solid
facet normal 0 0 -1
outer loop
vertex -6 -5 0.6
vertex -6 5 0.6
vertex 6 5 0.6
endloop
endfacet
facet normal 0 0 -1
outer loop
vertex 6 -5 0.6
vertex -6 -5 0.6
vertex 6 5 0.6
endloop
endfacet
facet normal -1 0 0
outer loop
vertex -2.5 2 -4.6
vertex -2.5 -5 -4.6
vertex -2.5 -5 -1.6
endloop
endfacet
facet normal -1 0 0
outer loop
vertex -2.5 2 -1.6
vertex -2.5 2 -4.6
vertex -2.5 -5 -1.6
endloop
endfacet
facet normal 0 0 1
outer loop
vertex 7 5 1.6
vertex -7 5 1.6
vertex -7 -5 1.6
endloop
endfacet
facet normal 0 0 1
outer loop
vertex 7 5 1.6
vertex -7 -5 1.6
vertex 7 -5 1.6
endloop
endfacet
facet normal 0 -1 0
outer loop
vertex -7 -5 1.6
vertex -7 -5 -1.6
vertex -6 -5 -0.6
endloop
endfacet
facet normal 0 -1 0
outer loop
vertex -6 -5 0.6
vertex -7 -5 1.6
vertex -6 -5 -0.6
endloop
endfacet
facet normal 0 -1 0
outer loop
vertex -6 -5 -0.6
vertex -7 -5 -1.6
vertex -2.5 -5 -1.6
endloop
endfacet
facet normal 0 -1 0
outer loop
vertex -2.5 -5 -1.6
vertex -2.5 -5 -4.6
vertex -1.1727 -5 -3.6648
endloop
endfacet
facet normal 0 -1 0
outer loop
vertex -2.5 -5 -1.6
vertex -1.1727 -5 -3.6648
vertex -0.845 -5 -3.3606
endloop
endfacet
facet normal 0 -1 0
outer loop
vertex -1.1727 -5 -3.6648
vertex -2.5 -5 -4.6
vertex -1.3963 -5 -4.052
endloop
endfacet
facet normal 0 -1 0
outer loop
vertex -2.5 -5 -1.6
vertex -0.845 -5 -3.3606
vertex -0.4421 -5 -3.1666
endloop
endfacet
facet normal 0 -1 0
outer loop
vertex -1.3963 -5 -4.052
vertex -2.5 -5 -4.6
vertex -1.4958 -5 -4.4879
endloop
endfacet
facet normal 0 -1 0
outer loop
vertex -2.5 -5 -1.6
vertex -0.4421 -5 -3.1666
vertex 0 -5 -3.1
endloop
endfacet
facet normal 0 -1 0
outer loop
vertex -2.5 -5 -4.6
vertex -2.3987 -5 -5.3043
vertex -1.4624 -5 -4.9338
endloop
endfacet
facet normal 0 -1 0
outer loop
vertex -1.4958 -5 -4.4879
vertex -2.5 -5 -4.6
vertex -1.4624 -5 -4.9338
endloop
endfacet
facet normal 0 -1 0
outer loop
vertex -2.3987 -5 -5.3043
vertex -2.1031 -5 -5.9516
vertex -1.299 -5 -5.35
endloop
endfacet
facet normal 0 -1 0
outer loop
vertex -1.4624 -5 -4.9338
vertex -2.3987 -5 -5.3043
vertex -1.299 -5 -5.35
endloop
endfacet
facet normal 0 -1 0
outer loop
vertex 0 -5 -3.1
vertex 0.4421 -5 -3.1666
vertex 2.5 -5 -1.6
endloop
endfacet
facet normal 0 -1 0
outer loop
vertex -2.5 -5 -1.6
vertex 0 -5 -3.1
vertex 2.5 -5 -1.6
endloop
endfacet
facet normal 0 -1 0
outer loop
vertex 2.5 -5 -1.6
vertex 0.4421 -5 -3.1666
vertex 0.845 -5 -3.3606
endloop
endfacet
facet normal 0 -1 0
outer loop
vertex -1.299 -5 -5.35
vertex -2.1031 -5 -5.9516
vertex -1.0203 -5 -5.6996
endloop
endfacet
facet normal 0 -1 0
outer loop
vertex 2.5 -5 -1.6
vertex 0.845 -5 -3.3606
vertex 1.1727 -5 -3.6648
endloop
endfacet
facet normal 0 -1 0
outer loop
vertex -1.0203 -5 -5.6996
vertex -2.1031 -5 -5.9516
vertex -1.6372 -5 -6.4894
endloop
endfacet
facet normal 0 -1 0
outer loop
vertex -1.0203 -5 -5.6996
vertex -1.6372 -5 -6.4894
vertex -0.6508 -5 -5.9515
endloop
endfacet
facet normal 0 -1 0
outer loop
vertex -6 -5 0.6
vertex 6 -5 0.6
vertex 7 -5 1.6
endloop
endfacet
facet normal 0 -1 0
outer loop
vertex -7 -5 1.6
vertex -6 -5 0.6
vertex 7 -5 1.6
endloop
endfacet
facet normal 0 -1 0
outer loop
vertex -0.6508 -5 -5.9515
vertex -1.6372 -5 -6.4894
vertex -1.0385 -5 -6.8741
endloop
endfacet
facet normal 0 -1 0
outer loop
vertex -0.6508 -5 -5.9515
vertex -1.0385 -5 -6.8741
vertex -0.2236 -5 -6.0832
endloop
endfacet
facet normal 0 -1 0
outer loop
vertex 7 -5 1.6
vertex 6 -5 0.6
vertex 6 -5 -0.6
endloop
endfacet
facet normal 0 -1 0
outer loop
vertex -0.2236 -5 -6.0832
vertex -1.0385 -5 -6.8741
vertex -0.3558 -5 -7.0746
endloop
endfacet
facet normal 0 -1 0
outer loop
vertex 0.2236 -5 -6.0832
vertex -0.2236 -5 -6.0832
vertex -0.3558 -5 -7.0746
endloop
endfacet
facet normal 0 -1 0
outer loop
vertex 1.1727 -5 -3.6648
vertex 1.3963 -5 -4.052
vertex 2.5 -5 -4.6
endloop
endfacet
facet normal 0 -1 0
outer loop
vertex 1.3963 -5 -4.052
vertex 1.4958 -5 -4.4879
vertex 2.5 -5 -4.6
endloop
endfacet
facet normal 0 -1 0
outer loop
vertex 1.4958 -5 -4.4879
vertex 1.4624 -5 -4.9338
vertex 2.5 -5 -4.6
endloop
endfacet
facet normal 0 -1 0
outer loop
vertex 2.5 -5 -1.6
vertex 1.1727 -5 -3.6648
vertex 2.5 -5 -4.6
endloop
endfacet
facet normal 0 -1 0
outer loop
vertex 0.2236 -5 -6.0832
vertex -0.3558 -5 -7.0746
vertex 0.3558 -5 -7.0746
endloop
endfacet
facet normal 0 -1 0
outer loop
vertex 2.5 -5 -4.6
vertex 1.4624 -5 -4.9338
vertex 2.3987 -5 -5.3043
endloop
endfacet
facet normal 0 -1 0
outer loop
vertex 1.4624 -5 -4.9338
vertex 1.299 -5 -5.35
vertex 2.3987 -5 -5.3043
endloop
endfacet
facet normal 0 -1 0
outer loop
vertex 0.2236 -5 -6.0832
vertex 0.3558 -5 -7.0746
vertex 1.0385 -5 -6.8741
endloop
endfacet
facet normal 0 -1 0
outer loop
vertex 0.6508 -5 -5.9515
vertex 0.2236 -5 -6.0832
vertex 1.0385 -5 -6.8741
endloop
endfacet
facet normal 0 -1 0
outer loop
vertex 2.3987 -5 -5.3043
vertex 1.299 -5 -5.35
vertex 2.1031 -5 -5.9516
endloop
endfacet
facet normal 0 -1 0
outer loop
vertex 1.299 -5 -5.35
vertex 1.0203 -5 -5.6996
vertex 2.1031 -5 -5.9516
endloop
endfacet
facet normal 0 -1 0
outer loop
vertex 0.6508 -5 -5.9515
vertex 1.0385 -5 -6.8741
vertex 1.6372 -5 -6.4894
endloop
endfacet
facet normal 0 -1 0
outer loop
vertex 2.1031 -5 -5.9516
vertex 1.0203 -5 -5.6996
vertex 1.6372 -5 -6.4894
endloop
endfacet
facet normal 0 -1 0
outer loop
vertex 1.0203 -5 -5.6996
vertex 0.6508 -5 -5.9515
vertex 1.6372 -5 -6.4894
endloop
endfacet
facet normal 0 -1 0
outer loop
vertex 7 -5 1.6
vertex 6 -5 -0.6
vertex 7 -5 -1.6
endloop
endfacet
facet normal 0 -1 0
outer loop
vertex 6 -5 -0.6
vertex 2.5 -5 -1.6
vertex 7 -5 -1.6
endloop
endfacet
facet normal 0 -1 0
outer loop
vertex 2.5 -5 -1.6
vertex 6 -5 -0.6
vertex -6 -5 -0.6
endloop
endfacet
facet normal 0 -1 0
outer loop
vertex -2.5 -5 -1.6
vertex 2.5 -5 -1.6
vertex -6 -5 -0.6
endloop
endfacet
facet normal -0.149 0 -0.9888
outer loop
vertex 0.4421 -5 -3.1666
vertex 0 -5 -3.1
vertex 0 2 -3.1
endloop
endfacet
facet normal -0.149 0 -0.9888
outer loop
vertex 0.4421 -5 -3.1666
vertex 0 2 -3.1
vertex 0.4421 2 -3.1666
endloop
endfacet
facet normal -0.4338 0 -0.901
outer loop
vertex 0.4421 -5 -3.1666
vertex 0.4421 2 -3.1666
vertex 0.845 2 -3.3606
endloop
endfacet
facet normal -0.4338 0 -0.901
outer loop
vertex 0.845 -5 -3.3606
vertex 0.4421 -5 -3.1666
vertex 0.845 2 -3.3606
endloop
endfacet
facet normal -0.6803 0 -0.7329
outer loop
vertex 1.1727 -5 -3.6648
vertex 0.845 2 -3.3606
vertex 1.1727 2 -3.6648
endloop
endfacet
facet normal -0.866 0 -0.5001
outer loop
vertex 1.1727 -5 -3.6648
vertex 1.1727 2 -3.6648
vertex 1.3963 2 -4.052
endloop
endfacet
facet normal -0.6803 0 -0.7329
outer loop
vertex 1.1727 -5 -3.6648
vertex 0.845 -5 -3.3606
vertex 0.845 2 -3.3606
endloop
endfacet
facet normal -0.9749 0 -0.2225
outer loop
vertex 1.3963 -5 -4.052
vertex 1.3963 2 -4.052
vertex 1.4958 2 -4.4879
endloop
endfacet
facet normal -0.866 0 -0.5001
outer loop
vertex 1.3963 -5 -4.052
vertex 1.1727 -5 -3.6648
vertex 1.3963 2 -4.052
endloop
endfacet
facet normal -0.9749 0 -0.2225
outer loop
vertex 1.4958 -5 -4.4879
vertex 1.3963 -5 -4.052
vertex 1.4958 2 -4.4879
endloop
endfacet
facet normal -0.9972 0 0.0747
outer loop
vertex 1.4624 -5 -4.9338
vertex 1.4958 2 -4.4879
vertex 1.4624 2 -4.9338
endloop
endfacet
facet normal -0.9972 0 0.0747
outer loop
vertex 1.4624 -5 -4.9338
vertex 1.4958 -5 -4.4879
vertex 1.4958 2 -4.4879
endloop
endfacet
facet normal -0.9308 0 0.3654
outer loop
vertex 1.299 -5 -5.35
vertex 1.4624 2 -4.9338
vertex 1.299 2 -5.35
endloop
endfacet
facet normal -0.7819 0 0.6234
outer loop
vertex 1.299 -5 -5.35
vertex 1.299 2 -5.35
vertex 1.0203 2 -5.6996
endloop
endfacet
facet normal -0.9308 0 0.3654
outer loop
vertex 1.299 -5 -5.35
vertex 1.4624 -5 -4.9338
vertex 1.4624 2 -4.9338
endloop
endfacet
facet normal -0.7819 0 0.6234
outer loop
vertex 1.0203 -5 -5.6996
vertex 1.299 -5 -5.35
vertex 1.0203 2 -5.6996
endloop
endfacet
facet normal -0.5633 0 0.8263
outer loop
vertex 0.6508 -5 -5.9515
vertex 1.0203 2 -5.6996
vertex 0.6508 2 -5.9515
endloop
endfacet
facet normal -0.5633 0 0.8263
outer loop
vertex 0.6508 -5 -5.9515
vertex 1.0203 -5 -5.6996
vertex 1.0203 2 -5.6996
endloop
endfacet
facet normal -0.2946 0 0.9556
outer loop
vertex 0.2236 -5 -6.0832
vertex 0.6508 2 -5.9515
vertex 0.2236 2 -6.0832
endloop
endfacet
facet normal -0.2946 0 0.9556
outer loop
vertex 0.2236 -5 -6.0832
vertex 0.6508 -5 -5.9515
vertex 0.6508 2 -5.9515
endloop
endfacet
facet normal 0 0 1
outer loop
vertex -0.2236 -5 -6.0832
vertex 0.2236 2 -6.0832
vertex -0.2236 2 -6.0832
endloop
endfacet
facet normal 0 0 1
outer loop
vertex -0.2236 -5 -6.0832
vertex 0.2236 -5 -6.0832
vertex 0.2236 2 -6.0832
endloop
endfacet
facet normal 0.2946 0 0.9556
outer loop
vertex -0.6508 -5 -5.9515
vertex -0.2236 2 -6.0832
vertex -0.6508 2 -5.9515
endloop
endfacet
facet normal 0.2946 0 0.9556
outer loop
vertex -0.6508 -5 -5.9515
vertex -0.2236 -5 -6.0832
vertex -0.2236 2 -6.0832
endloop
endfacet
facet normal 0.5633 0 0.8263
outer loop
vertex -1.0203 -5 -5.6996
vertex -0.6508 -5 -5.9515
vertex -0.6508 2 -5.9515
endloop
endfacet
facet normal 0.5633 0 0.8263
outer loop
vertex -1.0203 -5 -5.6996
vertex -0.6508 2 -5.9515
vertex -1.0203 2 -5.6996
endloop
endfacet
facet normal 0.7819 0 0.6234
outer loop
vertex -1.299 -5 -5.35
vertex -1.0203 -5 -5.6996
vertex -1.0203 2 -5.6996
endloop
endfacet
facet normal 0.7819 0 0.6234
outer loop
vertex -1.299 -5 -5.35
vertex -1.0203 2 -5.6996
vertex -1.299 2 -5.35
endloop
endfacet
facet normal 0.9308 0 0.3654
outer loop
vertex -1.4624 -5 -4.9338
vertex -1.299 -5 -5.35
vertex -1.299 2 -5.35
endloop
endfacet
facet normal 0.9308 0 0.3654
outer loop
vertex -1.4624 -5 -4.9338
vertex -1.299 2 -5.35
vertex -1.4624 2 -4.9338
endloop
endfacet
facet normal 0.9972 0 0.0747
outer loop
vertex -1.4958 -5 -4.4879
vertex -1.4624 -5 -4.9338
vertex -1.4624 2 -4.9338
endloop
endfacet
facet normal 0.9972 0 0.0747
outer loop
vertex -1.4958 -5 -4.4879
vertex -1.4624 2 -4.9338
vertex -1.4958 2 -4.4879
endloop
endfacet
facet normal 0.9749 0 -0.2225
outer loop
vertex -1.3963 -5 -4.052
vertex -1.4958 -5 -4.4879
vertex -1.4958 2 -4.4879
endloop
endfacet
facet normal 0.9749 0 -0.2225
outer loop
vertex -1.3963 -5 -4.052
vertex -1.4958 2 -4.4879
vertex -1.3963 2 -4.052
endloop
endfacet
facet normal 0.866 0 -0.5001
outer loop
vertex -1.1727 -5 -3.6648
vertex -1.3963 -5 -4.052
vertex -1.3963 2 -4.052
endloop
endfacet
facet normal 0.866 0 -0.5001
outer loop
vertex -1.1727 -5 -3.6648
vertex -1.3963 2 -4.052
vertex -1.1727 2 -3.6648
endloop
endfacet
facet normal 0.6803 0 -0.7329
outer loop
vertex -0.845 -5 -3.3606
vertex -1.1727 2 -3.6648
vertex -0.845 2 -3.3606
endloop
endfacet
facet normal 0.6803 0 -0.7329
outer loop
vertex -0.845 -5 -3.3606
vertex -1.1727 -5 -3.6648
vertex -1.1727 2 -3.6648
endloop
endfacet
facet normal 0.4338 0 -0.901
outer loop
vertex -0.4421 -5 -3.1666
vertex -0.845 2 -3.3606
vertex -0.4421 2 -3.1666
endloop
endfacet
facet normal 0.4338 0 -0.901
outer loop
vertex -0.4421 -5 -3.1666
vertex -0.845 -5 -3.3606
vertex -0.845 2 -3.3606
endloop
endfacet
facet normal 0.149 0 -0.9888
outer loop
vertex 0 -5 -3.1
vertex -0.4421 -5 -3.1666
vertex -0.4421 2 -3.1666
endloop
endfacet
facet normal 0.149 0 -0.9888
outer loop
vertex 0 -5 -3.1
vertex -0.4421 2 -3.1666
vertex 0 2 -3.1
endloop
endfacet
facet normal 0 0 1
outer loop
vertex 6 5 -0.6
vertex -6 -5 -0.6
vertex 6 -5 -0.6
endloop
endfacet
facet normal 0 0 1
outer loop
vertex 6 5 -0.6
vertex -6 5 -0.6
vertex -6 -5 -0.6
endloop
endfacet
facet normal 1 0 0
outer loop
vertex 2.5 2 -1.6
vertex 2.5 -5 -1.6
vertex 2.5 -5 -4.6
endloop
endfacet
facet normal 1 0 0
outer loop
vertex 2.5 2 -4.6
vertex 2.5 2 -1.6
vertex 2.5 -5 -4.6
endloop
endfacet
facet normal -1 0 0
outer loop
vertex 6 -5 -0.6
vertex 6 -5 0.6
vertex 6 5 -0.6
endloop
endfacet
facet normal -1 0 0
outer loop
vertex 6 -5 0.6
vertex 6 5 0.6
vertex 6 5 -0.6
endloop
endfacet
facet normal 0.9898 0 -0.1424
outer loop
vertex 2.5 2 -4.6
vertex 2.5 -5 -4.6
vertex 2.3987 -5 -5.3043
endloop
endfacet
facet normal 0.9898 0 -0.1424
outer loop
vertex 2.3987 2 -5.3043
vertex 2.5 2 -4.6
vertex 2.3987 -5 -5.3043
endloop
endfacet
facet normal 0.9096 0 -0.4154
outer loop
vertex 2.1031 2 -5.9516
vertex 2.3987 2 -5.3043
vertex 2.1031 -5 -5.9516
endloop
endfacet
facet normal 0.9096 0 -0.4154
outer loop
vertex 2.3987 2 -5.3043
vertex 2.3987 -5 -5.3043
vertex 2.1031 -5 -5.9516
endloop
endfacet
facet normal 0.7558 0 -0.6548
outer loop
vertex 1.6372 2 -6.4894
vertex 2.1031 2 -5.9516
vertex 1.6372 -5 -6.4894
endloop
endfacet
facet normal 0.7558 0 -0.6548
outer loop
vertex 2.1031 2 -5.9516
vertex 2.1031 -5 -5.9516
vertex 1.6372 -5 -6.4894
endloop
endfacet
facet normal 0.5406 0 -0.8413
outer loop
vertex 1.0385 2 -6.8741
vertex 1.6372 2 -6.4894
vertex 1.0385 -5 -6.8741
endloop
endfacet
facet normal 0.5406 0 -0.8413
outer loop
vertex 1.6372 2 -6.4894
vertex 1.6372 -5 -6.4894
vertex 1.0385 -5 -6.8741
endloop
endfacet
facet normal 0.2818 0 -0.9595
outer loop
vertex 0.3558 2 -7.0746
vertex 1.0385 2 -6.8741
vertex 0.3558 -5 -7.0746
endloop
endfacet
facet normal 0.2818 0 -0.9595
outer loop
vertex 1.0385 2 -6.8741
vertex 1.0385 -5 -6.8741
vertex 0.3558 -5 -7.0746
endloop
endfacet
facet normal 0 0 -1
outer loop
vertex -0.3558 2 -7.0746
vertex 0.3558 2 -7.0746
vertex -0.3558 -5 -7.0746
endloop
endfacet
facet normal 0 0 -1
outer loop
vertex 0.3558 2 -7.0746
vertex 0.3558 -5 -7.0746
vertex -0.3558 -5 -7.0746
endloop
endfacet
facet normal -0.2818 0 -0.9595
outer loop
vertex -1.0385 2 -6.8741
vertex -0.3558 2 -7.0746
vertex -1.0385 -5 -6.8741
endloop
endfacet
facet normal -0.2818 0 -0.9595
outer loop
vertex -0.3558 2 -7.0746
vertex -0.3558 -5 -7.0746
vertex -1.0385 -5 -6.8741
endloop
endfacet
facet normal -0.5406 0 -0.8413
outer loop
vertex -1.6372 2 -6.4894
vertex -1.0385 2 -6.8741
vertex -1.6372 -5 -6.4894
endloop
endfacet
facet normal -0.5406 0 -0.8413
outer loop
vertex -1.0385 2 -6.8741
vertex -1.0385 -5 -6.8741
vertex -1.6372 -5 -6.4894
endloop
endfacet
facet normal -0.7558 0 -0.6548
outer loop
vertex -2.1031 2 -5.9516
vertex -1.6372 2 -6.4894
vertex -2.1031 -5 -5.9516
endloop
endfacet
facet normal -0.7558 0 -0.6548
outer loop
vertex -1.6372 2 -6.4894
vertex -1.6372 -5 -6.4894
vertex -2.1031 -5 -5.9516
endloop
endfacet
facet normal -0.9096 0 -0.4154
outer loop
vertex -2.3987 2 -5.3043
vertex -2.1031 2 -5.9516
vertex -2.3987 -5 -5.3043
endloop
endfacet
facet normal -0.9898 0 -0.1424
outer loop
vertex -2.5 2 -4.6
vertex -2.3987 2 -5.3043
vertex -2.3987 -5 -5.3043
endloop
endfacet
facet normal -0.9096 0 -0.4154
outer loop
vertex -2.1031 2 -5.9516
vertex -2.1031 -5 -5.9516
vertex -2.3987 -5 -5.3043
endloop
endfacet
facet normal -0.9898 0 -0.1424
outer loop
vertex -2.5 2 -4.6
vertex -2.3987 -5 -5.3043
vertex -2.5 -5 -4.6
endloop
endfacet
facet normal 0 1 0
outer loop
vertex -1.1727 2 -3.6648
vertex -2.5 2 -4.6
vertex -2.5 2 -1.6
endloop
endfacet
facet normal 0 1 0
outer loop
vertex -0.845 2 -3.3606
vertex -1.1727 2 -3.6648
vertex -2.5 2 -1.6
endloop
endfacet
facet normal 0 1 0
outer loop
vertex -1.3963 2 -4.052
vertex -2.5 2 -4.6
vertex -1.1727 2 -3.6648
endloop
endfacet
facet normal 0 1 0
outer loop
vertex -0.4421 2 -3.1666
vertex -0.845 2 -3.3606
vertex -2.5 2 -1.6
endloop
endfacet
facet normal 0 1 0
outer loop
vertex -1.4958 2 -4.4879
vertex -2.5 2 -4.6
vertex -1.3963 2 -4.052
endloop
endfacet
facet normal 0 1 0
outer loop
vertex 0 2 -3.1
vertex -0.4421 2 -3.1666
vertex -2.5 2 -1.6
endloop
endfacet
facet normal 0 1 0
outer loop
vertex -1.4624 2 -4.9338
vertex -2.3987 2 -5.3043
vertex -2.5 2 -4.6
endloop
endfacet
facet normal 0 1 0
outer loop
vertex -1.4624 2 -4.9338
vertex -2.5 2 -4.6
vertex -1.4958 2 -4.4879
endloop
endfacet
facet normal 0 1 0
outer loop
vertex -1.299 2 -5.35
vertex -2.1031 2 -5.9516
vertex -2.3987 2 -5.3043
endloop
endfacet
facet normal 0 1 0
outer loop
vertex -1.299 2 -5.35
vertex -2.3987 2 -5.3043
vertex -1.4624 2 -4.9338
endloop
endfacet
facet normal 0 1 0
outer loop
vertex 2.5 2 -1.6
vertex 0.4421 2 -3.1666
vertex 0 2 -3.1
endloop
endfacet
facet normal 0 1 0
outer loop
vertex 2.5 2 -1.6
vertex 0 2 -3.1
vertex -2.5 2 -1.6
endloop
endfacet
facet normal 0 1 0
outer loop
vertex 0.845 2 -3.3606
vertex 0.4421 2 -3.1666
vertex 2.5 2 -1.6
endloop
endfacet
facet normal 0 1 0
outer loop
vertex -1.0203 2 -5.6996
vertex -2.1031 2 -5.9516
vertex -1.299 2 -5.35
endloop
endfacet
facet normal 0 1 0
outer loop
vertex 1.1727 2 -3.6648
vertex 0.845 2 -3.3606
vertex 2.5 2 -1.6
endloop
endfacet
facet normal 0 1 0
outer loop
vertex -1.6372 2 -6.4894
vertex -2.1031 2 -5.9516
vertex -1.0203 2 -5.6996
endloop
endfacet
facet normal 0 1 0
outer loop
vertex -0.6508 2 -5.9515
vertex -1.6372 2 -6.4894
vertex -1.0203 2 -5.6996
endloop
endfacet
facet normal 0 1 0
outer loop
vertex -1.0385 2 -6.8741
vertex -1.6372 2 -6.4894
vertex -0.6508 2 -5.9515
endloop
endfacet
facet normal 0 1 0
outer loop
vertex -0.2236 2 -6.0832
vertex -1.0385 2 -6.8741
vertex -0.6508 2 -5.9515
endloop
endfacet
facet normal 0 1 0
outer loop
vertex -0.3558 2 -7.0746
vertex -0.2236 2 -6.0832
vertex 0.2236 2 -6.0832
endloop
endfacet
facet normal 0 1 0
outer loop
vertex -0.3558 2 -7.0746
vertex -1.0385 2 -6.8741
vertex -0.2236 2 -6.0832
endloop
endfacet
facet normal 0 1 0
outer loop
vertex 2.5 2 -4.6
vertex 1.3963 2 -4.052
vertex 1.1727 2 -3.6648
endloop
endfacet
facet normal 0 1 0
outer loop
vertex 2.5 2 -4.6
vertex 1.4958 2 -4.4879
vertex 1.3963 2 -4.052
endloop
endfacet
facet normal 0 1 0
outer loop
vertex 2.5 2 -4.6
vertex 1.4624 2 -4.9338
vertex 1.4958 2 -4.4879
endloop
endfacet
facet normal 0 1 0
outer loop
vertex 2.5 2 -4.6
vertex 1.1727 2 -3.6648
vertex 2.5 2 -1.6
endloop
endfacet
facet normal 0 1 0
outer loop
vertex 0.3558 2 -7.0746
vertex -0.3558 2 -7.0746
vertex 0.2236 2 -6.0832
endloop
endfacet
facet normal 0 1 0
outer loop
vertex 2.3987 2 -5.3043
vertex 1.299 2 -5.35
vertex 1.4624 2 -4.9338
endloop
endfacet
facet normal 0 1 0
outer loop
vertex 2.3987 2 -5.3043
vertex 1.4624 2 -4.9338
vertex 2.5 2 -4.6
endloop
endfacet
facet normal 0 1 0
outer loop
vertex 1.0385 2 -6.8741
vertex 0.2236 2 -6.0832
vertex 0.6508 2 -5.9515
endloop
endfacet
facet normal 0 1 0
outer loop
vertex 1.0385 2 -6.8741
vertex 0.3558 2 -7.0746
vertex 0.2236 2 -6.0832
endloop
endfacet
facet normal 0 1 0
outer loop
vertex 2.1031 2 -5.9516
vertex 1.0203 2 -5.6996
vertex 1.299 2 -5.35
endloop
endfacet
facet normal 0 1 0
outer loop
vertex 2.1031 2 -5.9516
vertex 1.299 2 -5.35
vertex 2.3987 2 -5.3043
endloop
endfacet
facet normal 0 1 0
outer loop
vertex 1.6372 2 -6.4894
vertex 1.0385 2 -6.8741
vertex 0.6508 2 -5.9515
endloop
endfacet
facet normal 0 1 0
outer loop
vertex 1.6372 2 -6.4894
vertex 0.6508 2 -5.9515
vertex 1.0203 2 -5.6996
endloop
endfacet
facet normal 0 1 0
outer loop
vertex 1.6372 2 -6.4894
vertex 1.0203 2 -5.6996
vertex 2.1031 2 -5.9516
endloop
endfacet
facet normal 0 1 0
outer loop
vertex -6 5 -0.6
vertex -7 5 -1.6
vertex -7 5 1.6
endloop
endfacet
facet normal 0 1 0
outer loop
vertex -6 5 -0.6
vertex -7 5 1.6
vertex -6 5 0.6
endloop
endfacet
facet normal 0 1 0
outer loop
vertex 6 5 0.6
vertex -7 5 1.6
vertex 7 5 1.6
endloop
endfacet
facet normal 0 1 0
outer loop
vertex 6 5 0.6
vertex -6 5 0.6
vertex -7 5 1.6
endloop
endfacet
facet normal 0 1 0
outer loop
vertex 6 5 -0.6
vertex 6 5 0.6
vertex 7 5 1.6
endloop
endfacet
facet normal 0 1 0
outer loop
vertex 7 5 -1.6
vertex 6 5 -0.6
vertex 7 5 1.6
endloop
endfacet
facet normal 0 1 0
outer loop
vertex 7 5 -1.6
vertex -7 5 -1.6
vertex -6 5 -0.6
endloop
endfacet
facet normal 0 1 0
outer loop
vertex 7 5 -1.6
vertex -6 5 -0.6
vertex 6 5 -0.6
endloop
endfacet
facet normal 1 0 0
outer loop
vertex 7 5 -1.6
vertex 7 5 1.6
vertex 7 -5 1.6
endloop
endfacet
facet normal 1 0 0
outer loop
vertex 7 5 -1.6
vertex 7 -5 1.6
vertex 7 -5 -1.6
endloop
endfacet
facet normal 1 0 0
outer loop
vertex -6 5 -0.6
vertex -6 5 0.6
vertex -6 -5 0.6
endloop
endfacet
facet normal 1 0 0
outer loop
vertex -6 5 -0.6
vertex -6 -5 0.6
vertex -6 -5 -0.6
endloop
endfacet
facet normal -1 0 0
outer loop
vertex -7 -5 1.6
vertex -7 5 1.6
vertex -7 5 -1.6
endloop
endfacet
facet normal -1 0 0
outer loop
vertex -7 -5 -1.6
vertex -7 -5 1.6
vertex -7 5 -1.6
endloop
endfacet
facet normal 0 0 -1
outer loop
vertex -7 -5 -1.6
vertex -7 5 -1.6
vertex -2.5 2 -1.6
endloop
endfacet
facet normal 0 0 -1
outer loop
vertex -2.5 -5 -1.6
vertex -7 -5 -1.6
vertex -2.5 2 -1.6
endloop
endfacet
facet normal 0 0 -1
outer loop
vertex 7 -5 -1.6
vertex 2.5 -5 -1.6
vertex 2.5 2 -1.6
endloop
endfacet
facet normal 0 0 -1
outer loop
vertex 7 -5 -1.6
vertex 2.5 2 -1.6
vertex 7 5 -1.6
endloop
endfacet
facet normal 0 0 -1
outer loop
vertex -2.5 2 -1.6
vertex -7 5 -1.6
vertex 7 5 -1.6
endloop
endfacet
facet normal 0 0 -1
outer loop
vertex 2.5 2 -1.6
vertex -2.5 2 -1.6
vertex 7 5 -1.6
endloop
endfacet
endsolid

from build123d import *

# Parameters (mm, degrees)
SKETCH1_W                = 12
SKETCH1_H                = 1.2
BOSS_EXTRUDE1_DEPTH      = 5
BOSS_EXTRUDE2_DEPTH      = 2
BOSS_EXTRUDE2_DEPTH_BACK = 5
SKETCH1_3_R              = 1.5


with BuildPart() as part:
    # Sketch1 → Boss-Extrude1 (new, symmetric)
    with BuildSketch(Plane(origin=(0, 0, 0), x_dir=(1, 0, 0), z_dir=(0, 1, 0))):
        Polygon((2.5, 1.6), (-2.5, 1.6), (-7, 1.6), (-7, -1.6), (7, -1.6), (7, 1.6), align=None)
        Rectangle(SKETCH1_W, SKETCH1_H, mode=Mode.SUBTRACT)
    extrude(amount=BOSS_EXTRUDE1_DEPTH, both=True)

    # Sketch1<3> → Boss-Extrude2 (add, two sides: drawn at the far end of the back side and taken through both)
    with BuildSketch(Plane(origin=(0, 0, 0), x_dir=(1, 0, 0), z_dir=(0, 1, 0)).offset(-BOSS_EXTRUDE2_DEPTH_BACK)):
        with BuildLine():
            ThreePointArc((2.5, 4.6), (0, 7.1), (-2.5, 4.6))
            Line((-2.5, 4.6), (-2.5, 1.6))
            Line((-2.5, 1.6), (2.5, 1.6))
            Line((2.5, 1.6), (2.5, 4.6))
        make_face()
        with Locations((0, 4.6)):
            Circle(SKETCH1_3_R, mode=Mode.SUBTRACT)
    extrude(amount=BOSS_EXTRUDE2_DEPTH + BOSS_EXTRUDE2_DEPTH_BACK)


solid = part.part
